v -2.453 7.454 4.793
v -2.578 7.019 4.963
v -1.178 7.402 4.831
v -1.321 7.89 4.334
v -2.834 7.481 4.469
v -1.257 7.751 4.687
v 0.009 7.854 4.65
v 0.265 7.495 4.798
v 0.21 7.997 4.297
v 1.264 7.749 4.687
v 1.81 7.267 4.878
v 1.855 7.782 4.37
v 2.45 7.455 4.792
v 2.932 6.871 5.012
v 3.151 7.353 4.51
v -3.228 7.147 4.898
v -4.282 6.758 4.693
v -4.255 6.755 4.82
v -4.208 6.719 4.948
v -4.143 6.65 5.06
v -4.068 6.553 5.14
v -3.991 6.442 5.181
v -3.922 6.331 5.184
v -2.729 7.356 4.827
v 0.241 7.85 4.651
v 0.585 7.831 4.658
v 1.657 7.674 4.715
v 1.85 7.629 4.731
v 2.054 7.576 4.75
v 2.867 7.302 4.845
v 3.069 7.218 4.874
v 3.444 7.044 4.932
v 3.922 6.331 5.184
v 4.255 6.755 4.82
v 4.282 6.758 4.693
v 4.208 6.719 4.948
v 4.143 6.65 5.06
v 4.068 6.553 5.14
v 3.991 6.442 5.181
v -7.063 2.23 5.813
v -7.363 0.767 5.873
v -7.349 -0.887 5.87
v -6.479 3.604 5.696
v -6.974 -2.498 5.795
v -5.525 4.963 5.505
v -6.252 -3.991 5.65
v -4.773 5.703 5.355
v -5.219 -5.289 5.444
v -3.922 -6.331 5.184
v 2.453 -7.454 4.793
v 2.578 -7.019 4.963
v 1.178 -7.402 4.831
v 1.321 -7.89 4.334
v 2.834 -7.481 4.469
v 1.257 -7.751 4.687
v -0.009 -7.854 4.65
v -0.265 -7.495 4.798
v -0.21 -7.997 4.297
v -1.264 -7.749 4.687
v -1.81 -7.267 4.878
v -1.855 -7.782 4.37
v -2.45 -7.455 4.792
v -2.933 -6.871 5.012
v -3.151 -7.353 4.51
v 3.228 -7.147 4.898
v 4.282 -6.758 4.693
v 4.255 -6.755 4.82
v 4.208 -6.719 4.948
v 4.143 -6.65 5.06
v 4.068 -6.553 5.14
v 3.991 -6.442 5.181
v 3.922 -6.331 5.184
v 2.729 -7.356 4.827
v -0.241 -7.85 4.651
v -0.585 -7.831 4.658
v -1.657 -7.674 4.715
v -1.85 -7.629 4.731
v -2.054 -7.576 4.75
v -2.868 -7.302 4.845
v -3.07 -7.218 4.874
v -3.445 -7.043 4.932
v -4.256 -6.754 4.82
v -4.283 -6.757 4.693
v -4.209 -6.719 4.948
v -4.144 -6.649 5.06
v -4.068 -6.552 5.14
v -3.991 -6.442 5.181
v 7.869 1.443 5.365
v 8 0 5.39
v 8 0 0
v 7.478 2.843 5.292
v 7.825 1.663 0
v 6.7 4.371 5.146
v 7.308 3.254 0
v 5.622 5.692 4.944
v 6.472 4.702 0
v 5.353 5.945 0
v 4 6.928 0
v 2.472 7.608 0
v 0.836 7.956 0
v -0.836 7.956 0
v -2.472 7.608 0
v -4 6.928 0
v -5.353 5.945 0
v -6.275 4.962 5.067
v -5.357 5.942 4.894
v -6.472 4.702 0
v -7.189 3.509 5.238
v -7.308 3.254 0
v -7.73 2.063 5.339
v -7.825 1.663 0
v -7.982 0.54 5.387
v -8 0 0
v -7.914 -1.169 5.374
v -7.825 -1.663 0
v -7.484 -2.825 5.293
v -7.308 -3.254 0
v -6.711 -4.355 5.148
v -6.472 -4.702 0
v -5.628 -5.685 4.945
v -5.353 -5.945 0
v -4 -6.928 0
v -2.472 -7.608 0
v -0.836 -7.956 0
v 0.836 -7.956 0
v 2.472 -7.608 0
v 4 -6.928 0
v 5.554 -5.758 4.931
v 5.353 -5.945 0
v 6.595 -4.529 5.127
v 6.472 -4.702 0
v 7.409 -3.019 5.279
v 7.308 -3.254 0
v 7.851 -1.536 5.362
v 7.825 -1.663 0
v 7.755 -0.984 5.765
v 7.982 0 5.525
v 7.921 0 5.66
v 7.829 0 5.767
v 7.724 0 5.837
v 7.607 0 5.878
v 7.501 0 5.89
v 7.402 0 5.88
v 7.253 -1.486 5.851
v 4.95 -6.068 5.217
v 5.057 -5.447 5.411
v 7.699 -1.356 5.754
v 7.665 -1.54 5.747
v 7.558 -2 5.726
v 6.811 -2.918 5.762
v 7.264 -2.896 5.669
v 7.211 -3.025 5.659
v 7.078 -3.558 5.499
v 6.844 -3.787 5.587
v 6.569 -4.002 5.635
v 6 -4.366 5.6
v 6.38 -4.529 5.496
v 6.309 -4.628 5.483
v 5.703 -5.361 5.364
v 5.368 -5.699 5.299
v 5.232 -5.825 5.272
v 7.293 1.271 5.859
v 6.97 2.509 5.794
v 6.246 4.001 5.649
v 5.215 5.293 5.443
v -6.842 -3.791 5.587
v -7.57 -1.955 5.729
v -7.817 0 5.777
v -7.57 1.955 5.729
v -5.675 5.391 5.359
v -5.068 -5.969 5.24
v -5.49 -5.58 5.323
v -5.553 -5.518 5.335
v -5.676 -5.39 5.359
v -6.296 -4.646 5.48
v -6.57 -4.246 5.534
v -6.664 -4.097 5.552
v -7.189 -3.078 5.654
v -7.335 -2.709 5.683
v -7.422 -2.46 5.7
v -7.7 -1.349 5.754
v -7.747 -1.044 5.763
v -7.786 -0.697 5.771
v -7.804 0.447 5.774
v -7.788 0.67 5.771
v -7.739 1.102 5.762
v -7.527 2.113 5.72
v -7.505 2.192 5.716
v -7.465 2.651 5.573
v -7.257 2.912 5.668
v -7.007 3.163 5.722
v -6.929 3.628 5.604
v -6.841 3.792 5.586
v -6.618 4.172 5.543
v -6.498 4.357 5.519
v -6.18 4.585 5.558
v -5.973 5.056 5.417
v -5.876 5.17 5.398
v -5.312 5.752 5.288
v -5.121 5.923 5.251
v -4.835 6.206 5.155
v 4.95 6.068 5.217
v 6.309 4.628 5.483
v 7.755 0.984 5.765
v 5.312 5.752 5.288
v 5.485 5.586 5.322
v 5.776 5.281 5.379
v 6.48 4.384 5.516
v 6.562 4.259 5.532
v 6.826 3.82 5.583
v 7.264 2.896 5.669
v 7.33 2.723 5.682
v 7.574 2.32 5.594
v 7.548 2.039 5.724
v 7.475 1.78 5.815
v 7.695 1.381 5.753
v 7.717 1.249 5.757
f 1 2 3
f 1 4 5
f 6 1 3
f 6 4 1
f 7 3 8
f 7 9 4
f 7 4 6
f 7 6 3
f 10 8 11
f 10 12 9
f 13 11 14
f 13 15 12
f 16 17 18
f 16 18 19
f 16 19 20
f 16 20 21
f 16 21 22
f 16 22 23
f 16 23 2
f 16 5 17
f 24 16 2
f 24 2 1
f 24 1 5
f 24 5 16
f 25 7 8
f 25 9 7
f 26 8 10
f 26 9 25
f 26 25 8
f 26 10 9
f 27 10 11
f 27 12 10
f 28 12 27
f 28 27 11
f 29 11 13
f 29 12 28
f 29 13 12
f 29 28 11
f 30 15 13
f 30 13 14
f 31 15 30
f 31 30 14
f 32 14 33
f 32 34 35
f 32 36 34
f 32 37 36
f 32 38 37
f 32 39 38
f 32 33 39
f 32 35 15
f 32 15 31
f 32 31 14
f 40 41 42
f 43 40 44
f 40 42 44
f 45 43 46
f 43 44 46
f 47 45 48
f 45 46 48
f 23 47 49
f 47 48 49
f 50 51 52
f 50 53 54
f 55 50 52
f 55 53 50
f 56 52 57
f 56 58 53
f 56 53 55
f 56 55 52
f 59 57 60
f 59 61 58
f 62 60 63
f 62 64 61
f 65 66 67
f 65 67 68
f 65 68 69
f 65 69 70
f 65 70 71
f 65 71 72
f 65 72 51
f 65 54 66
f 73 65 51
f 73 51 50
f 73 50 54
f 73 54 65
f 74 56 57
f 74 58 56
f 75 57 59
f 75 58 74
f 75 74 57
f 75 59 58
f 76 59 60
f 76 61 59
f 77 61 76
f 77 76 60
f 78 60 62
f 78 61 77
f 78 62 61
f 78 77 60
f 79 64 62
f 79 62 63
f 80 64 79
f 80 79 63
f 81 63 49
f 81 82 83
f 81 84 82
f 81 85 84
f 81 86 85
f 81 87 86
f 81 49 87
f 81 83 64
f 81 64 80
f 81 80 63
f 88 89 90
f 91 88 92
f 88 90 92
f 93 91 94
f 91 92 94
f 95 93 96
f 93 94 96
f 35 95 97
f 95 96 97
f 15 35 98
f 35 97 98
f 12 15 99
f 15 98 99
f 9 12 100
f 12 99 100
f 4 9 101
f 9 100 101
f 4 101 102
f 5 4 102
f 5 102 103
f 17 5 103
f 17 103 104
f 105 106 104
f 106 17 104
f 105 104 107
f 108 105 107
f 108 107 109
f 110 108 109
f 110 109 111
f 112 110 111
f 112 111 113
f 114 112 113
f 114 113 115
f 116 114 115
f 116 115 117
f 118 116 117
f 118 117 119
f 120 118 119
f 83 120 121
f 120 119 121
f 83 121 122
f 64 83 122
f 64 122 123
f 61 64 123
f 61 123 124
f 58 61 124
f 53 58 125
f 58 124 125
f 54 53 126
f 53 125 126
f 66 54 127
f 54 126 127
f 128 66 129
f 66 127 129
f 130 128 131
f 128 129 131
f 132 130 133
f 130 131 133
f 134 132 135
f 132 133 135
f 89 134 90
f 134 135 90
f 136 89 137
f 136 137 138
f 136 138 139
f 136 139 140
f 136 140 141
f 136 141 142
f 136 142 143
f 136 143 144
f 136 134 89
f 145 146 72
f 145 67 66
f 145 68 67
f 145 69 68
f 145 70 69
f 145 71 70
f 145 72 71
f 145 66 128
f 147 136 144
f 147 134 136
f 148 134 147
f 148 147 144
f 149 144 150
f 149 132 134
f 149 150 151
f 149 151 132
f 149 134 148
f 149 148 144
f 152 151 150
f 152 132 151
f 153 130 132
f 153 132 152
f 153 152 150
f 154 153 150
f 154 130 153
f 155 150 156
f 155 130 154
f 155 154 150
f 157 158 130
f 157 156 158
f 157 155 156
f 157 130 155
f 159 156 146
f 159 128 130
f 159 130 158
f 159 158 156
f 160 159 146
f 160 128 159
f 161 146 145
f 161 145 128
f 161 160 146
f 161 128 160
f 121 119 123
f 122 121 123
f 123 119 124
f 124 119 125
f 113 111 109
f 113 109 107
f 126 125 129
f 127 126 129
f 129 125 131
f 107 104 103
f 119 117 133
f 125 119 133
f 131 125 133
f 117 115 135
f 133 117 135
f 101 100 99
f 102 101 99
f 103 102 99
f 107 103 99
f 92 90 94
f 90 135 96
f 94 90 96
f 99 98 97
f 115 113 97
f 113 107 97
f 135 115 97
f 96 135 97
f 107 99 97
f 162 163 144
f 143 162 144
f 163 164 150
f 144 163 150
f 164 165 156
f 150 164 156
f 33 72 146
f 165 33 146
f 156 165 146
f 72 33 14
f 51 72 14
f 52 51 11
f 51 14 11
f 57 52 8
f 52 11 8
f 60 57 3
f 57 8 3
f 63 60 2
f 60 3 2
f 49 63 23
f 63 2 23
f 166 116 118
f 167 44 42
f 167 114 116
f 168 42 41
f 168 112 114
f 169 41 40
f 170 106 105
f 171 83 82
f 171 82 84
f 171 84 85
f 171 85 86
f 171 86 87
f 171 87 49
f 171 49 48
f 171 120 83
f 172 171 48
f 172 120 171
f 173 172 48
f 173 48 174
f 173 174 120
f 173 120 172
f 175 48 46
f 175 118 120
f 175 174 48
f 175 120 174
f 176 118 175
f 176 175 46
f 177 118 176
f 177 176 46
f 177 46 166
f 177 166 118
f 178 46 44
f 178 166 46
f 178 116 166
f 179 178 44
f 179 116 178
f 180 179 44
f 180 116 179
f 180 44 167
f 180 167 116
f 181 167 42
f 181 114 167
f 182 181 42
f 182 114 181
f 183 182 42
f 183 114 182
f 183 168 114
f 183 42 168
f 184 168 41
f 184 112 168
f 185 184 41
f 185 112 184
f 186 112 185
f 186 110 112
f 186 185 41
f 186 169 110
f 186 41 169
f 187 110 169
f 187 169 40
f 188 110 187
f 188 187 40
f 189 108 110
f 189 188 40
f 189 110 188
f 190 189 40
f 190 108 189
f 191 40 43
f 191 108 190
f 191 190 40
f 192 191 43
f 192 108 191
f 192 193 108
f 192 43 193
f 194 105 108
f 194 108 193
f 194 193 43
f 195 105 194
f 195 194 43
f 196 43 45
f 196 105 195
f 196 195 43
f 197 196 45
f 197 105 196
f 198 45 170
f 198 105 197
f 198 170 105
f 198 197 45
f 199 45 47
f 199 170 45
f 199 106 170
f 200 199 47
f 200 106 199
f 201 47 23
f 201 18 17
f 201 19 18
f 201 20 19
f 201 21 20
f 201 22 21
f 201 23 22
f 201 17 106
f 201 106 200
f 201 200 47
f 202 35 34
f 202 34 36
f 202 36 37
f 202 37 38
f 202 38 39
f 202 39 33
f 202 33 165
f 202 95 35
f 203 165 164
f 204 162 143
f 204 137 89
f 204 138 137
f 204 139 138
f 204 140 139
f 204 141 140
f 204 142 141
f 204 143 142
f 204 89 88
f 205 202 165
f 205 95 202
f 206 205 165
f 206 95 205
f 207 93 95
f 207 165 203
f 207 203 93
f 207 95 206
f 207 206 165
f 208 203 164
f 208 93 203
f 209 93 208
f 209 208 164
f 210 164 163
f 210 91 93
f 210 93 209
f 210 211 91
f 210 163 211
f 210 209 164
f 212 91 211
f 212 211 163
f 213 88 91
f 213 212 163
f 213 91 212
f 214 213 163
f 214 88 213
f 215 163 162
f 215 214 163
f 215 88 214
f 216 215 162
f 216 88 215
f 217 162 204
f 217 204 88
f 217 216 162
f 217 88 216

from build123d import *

# Parameters (mm, degrees)
F0_R     = 8
F1_DEPTH = 6
F4_DEPTH = 16.001
F5_R     = 20
F6_R     = 0.5


with BuildPart() as f1:
    # F0 (on Top) → F1 (new body)
    with BuildSketch(Plane.XY):
        Circle(F0_R)
    extrude(amount=F1_DEPTH)

    # F3 (on offset) → F4 (cut, through all)
    with BuildSketch(Plane.XZ.offset(8)):
        Polygon((8, 6), (-8, 6), (0, 4.4), align=None)
    extrude(amount=-F4_DEPTH, mode=Mode.SUBTRACT)

    # F5
    f5_edges = [f1.edges().sort_by_distance(p)[0] for p in [
        (0, 0, 4.4),
    ]]
    fillet(f5_edges, radius=F5_R)

    # F6
    f6_edges = [f1.edges().sort_by_distance(p)[0] for p in [
        (-6.896857, -4.053808, 5.779371),
        (-6.896857, 4.053808, 5.779371),
    ]]
    fillet(f6_edges, radius=F6_R)


solid = f1.part
